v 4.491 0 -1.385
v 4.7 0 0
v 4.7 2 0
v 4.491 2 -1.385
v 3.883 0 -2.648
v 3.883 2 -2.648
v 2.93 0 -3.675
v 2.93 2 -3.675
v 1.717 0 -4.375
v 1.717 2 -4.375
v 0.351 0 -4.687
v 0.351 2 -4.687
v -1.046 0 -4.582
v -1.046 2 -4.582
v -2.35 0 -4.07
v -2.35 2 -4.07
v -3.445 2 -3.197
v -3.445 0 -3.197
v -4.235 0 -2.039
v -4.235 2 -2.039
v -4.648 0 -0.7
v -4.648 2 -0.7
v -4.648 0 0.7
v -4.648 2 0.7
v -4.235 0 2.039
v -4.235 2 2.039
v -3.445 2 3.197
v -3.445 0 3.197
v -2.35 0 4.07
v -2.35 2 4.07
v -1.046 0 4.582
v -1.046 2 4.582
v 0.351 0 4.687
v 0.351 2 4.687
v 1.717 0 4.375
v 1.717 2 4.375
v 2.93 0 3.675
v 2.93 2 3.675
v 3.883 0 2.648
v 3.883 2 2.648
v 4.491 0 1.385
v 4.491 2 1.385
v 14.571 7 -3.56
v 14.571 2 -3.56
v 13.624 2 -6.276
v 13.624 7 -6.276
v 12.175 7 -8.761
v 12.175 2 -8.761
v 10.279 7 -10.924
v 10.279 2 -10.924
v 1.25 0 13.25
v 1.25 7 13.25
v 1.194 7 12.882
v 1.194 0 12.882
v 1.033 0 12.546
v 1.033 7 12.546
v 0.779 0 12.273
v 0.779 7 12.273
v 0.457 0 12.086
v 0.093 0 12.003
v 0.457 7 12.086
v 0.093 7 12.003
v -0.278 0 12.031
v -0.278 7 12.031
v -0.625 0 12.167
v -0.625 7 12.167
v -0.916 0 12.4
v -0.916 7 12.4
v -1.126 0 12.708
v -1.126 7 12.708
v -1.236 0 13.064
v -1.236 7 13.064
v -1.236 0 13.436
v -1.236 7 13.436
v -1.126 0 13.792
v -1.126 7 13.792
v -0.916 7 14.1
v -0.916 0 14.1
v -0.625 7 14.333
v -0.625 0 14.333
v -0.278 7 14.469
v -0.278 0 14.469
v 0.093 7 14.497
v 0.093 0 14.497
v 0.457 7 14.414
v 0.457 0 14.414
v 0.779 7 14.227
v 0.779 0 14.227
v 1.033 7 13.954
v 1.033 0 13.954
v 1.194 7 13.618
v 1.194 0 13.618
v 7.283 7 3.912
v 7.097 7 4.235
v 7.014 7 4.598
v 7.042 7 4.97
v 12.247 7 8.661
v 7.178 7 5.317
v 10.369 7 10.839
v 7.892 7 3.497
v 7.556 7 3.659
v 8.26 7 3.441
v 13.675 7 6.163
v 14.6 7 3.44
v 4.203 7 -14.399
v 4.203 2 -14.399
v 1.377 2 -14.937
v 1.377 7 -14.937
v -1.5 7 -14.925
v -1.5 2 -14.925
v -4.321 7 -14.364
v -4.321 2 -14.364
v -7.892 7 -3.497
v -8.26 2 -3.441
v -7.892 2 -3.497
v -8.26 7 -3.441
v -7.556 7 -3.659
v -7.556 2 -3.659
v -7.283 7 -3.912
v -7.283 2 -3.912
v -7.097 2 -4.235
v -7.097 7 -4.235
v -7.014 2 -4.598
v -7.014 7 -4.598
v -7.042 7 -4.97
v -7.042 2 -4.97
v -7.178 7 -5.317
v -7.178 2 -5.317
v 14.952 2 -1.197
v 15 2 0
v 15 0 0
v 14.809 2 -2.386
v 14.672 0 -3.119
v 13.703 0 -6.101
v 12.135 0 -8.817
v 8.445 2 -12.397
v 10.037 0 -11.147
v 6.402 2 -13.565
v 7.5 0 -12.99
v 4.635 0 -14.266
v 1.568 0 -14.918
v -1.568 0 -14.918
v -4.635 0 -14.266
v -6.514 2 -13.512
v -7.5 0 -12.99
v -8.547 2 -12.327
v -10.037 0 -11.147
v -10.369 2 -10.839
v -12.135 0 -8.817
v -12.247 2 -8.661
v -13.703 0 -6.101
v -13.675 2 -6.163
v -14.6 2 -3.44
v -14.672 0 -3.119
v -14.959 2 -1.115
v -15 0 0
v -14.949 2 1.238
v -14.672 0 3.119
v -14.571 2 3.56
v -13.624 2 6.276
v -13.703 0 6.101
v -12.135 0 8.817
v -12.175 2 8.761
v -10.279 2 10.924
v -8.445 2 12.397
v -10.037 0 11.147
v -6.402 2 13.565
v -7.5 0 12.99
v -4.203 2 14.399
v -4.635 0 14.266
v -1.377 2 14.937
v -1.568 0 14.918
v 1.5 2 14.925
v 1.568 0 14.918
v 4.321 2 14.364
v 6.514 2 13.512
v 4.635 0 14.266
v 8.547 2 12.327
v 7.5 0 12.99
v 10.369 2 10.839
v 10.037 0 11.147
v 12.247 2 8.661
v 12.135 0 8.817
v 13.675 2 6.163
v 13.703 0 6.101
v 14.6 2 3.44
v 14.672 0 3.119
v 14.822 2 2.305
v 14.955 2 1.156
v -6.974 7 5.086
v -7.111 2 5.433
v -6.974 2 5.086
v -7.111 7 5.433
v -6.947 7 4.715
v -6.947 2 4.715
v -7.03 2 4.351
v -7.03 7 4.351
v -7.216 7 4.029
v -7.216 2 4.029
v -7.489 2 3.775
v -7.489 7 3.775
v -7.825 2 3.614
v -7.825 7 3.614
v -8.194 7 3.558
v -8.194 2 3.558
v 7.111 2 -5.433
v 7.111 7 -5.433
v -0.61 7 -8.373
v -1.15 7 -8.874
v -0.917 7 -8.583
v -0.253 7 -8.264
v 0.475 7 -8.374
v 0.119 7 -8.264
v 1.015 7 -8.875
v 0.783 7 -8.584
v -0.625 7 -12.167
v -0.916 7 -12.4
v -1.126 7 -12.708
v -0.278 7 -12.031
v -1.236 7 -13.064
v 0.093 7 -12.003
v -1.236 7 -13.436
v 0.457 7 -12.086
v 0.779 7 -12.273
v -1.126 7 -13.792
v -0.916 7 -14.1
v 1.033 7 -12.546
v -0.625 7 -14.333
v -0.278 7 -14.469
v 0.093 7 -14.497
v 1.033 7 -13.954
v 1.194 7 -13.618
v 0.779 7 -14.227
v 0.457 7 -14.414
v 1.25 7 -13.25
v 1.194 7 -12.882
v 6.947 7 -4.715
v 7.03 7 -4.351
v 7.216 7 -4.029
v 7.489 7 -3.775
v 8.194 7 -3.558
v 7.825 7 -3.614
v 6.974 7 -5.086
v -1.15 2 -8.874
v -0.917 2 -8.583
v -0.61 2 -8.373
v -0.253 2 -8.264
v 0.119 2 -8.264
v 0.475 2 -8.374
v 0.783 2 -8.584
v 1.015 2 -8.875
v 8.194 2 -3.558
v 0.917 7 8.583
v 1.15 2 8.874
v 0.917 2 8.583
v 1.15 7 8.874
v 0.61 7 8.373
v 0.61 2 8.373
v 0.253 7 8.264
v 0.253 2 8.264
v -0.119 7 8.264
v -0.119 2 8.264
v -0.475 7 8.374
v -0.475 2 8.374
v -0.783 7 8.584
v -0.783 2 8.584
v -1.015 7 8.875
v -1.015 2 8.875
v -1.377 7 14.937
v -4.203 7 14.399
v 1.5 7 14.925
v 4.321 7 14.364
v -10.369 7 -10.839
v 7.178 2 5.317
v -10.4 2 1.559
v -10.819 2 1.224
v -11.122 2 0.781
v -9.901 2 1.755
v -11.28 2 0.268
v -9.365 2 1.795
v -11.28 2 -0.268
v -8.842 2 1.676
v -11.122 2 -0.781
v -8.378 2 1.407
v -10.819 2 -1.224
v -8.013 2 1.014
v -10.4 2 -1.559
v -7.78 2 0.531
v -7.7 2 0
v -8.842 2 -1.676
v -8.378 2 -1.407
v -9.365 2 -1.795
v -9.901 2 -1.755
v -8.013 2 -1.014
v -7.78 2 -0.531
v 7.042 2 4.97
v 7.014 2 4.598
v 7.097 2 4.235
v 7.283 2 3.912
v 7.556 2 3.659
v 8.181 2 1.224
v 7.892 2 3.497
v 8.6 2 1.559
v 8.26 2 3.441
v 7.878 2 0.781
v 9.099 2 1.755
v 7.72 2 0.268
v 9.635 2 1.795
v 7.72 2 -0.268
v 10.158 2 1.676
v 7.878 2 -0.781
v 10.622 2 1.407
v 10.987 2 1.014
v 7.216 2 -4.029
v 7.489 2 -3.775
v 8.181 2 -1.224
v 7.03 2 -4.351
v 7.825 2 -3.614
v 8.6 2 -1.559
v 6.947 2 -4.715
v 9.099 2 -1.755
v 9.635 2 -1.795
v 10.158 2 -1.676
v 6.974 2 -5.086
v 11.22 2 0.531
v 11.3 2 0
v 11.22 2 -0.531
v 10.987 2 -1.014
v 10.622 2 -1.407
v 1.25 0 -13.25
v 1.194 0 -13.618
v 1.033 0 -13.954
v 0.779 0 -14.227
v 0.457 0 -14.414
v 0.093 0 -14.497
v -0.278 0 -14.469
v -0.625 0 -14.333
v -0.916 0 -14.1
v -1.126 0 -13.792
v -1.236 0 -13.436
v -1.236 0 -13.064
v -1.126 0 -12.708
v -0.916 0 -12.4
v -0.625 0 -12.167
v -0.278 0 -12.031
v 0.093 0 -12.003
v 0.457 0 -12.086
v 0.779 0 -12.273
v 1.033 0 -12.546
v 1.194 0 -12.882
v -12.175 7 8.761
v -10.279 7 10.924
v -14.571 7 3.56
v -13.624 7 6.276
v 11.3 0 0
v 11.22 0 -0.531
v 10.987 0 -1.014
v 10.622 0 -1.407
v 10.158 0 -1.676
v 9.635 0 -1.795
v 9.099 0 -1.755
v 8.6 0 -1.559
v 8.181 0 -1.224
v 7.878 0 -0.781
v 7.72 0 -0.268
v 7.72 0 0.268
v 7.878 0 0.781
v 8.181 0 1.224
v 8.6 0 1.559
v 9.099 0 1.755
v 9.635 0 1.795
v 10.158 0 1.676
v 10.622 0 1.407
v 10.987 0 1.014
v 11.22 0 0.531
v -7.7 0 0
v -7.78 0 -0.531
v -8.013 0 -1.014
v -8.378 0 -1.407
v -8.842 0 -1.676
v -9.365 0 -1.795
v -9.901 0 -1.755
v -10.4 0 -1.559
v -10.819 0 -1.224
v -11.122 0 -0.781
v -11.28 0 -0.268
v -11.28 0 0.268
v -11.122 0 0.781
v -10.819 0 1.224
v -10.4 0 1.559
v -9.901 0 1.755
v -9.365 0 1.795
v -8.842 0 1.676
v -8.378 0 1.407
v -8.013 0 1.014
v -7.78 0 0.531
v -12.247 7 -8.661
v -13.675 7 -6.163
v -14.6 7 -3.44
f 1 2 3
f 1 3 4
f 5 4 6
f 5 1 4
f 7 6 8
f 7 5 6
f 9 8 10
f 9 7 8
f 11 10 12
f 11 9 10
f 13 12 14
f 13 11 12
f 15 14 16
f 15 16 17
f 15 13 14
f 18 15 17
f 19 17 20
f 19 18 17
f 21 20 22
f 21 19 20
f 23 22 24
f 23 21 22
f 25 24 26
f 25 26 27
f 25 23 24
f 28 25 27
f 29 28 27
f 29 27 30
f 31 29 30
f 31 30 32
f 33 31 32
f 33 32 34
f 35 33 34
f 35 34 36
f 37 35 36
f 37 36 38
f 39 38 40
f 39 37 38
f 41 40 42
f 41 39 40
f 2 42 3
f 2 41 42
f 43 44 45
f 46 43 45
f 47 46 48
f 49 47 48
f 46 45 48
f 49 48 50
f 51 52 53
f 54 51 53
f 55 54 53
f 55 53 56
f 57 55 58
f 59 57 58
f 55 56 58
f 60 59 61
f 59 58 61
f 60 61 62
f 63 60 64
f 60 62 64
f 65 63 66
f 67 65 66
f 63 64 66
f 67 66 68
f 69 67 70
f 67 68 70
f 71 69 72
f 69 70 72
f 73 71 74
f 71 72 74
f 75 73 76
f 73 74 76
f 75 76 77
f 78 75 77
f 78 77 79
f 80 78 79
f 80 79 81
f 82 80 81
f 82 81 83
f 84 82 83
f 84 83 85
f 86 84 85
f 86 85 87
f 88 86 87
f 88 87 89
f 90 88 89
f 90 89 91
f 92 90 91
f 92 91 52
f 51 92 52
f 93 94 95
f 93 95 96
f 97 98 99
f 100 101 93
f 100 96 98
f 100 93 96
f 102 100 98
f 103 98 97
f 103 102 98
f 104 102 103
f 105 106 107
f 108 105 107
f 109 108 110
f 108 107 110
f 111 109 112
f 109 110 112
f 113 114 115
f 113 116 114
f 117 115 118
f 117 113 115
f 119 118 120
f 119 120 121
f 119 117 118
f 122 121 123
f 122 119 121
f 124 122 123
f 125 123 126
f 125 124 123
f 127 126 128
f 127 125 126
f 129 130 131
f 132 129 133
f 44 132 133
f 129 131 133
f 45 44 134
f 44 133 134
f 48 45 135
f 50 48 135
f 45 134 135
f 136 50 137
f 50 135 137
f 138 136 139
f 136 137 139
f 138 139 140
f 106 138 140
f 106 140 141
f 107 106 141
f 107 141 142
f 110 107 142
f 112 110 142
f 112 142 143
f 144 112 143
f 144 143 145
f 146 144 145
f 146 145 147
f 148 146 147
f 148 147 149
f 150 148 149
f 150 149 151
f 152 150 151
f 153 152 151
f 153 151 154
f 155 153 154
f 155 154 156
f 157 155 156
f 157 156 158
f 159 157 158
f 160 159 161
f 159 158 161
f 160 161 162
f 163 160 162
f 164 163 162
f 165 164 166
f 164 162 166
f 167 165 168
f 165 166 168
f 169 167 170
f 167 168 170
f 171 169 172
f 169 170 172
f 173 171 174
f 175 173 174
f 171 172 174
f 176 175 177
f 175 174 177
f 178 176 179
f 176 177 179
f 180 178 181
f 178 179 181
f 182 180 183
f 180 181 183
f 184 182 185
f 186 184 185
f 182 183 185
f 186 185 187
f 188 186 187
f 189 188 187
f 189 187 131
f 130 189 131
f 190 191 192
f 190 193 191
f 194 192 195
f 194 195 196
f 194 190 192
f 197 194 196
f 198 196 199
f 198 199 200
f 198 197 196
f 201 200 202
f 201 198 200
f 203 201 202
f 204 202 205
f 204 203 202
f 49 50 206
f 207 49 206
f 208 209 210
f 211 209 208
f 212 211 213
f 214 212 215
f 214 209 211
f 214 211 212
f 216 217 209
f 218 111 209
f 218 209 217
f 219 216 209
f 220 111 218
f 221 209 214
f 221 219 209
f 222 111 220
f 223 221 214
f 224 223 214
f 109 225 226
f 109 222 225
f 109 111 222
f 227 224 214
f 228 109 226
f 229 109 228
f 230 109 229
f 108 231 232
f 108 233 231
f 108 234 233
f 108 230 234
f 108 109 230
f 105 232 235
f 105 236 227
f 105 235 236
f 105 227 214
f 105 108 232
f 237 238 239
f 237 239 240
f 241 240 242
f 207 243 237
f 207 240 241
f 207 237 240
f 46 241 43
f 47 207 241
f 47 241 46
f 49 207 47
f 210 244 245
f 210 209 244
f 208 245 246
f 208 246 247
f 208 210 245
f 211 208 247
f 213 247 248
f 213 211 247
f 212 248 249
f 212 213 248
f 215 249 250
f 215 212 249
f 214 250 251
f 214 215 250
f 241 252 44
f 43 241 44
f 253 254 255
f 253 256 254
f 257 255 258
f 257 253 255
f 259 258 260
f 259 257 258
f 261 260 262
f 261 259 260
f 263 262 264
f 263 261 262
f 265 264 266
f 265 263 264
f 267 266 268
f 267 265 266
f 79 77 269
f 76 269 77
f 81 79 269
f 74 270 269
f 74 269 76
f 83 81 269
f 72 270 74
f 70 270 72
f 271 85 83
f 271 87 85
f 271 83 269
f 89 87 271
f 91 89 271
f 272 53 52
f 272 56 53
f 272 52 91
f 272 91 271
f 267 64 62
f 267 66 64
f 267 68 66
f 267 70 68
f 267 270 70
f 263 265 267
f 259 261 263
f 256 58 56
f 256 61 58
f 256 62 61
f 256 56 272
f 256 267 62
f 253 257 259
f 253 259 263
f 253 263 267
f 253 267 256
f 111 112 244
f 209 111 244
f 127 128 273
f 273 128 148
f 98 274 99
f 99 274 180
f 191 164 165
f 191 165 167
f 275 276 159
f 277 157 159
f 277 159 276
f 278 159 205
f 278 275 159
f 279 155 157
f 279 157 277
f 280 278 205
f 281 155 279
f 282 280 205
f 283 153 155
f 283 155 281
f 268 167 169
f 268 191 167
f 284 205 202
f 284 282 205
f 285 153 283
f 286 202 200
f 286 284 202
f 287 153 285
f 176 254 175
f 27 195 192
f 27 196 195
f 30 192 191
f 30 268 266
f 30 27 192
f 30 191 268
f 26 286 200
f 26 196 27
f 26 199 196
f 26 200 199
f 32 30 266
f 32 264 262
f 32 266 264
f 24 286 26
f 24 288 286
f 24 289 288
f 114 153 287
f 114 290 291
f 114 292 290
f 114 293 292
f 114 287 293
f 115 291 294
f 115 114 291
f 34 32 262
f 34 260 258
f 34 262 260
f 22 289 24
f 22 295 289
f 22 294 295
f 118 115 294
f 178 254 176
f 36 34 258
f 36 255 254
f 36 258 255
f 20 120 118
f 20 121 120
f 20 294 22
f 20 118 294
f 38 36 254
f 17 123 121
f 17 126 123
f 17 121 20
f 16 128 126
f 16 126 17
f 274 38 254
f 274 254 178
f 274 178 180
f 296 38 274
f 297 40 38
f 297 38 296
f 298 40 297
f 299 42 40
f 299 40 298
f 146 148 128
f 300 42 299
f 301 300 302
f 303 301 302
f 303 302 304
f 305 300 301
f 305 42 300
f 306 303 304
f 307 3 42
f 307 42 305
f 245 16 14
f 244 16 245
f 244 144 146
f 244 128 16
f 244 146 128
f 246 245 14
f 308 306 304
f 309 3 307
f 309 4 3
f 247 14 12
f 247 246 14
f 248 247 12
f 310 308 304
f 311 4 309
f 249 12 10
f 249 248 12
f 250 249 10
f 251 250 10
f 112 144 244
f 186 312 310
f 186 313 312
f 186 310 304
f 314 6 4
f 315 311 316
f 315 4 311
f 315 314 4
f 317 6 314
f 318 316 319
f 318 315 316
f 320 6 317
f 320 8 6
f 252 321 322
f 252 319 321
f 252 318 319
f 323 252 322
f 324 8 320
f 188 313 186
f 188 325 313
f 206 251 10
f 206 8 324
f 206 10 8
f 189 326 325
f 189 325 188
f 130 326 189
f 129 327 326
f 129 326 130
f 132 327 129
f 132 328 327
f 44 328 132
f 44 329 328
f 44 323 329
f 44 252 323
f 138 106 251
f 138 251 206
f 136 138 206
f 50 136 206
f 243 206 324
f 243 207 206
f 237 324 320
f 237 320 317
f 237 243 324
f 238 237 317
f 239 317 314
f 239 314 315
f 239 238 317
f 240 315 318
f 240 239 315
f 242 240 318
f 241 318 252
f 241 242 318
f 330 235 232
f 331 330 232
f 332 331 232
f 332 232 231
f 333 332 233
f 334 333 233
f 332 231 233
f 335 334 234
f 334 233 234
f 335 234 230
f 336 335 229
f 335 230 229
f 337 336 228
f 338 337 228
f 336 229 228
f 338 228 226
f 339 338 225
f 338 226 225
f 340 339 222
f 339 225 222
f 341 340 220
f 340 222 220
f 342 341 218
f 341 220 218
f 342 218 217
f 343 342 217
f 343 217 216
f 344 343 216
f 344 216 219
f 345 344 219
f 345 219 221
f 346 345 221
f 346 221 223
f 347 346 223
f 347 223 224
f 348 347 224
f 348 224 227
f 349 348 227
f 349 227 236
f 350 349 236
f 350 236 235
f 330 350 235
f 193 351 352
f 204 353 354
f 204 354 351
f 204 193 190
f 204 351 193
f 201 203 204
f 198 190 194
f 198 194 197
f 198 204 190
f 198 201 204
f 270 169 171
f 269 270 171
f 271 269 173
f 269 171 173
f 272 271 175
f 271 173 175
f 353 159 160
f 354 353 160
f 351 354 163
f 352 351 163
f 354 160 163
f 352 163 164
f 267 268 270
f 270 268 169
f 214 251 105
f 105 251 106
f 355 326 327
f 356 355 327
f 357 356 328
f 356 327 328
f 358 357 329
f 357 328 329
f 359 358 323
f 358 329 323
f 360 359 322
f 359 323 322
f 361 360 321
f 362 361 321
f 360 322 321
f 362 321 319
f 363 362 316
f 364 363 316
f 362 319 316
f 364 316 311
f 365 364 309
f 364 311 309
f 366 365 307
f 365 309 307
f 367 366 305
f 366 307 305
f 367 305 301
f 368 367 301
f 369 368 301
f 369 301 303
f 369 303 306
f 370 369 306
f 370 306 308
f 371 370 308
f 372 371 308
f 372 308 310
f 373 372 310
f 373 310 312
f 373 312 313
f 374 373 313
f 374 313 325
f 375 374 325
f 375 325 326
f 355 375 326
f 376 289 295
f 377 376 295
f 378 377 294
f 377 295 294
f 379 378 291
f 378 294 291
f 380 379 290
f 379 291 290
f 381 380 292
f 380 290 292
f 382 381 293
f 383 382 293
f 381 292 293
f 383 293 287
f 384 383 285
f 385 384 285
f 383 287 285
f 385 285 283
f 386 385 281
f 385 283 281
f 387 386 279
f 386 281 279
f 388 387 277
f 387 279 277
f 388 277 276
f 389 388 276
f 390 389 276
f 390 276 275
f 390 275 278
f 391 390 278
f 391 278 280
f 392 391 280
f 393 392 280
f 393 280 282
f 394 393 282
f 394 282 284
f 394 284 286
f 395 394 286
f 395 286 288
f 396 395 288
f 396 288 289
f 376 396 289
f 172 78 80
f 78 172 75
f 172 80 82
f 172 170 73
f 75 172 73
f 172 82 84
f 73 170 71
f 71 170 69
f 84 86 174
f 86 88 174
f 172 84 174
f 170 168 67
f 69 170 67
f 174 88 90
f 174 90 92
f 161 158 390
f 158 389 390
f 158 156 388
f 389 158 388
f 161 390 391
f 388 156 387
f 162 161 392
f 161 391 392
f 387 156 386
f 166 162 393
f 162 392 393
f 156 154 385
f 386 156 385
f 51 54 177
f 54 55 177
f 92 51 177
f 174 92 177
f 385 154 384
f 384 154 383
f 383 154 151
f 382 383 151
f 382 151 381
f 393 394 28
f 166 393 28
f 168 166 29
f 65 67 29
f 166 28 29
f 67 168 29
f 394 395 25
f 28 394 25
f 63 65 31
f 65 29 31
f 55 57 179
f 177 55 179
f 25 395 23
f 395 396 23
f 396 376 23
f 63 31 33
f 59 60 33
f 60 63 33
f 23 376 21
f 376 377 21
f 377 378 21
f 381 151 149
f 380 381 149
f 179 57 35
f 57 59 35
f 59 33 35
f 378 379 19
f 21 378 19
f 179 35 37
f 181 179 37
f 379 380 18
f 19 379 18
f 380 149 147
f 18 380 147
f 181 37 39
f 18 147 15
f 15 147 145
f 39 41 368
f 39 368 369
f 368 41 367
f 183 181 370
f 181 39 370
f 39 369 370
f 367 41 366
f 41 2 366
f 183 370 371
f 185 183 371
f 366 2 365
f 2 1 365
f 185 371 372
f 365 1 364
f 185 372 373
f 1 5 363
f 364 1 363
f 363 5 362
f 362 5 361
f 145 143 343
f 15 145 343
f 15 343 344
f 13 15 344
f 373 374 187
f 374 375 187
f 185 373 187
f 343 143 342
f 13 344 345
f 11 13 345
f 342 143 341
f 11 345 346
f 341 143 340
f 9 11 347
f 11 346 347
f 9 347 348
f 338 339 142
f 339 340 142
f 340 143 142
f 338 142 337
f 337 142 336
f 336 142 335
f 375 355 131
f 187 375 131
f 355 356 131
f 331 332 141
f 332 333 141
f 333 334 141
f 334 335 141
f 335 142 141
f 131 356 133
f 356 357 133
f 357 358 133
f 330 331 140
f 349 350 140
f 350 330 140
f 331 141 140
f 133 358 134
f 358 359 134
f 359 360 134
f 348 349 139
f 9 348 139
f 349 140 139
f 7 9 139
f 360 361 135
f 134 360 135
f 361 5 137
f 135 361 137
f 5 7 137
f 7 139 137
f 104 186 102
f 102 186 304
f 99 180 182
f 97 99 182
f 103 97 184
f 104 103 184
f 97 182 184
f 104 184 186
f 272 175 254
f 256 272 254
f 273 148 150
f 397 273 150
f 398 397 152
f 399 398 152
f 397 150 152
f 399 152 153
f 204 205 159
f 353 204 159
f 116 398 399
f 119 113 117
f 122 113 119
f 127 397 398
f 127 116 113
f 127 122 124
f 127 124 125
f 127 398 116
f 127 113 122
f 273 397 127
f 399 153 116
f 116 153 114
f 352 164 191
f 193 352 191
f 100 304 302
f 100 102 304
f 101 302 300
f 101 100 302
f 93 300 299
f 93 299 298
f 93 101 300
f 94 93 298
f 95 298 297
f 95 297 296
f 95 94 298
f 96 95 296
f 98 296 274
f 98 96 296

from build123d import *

# Parameters (mm, degrees)
SKETCH1_R         = 15
SKETCH1_R_2       = 4.7
BASE_DEPTH        = 2
TRIANGLES_DEPTH   = 5
FILLET1_R         = 1.25
WHEEL_HOLES_REACH = 4
SKETCH3_R         = 1.8
SKETCH4_R         = 1.25
HORN_HOLES_DEPTH  = 8


with BuildPart() as part:
    # Sketch1 → Base (new body)
    with BuildSketch(Plane(origin=(0, 0, 0), x_dir=(1, 0, 0), z_dir=(0, 1, 0))):
        Circle(SKETCH1_R)
        Circle(SKETCH1_R_2, mode=Mode.SUBTRACT)
    extrude(amount=BASE_DEPTH)

    # Sketch2 → Triangles (add)
    with BuildSketch(Plane(origin=(0, 2, 0), x_dir=(1, 0, 0), z_dir=(0, 1, 0))):
        with BuildLine():
            Line((6.028500388, 3.557693505), (14.571422537, 3.560006353))
            ThreePointArc((14.571422537, 3.560006353), (12.959336441, 7.553515672), (10.279001399, 10.924382373))
            Line((10.279001399, 10.924382373), (6.028500388, 3.557693505))
        make_face()
        with BuildLine():
            Line((-0.066802761, 6.999681235), (4.202655329, 14.399225263))
            ThreePointArc((4.202655329, 14.399225263), (-0.061868239, 14.99987241), (-4.321291956, 14.364067524))
            Line((-4.321291956, 14.364067524), (-0.066802761, 6.999681235))
        make_face()
        with BuildLine():
            Line((6.095303148, -3.44198773), (10.368767208, -10.83921891))
            ThreePointArc((10.368767208, -10.83921891), (13.02120468, -7.446356739), (14.600293355, -3.439685151))
            Line((14.600293355, -3.439685151), (6.095303148, -3.44198773))
        make_face()
        with BuildLine():
            Line((0.066802761, -6.999681235), (-4.202655329, -14.399225263))
            ThreePointArc((-4.202655329, -14.399225263), (0.061868239, -14.99987241), (4.321291956, -14.364067524))
            Line((4.321291956, -14.364067524), (0.066802761, -6.999681235))
        make_face()
        with BuildLine():
            Line((-6.028500388, -3.557693505), (-14.571422537, -3.560006353))
            ThreePointArc((-14.571422537, -3.560006353), (-12.959336441, -7.553515672), (-10.279001399, -10.924382373))
            Line((-10.279001399, -10.924382373), (-6.028500388, -3.557693505))
        make_face()
        with BuildLine():
            Line((-6.095303148, 3.44198773), (-10.368767208, 10.83921891))
            ThreePointArc((-10.368767208, 10.83921891), (-13.02120468, 7.446356739), (-14.600293355, 3.439685151))
            Line((-14.600293355, 3.439685151), (-6.095303148, 3.44198773))
        make_face()
    extrude(amount=TRIANGLES_DEPTH)

    # Fillet1
    fillet1_edges = [part.edges().sort_by_distance(p)[0] for p in [
        (6.095303148, 4.5, 3.44198773),
        (0.066802761, 4.5, 6.999681235),
        (-6.028500388, 4.5, 3.557693505),
        (-6.095303148, 4.5, -3.44198773),
        (6.028500388, 4.5, -3.557693505),
        (-0.066802761, 4.5, -6.999681235),
    ]]
    fillet(fillet1_edges, radius=FILLET1_R)

    # Sketch3 → Wheel Holes (cut, up to next)
    with BuildSketch(Plane(origin=(0, 2, 0), x_dir=(1, 0, 0), z_dir=(0, 1, 0)), mode=Mode.PRIVATE) as wheel_holes_sk1:
        with Locations((-9.5, 0)):
            Circle(SKETCH3_R)
    wheel_holes_tool1 = extrude(wheel_holes_sk1.sketch, amount=-WHEEL_HOLES_REACH, mode=Mode.PRIVATE) & part.part
    add(wheel_holes_tool1.solids().sort_by_distance((-9.5, 2, 0))[0], mode=Mode.SUBTRACT)
    # Sketch3 → Wheel Holes (cut, up to next)
    with BuildSketch(Plane(origin=(0, 2, 0), x_dir=(1, 0, 0), z_dir=(0, 1, 0)), mode=Mode.PRIVATE) as wheel_holes_sk2:
        with Locations((9.5, 0)):
            Circle(SKETCH3_R)
    wheel_holes_tool2 = extrude(wheel_holes_sk2.sketch, amount=-WHEEL_HOLES_REACH, mode=Mode.PRIVATE) & part.part
    add(wheel_holes_tool2.solids().sort_by_distance((9.5, 2, 0))[0], mode=Mode.SUBTRACT)

    # Sketch4 → Horn Holes (cut, through all)
    with BuildSketch(Plane(origin=(0, 7, 0), x_dir=(1, 0, 0), z_dir=(0, 1, 0))):
        with Locations((0, 13.25)):
            Circle(SKETCH4_R)
        with Locations((0, -13.25)):
            Circle(SKETCH4_R)
    extrude(amount=-HORN_HOLES_DEPTH, mode=Mode.SUBTRACT)


solid = part.part
